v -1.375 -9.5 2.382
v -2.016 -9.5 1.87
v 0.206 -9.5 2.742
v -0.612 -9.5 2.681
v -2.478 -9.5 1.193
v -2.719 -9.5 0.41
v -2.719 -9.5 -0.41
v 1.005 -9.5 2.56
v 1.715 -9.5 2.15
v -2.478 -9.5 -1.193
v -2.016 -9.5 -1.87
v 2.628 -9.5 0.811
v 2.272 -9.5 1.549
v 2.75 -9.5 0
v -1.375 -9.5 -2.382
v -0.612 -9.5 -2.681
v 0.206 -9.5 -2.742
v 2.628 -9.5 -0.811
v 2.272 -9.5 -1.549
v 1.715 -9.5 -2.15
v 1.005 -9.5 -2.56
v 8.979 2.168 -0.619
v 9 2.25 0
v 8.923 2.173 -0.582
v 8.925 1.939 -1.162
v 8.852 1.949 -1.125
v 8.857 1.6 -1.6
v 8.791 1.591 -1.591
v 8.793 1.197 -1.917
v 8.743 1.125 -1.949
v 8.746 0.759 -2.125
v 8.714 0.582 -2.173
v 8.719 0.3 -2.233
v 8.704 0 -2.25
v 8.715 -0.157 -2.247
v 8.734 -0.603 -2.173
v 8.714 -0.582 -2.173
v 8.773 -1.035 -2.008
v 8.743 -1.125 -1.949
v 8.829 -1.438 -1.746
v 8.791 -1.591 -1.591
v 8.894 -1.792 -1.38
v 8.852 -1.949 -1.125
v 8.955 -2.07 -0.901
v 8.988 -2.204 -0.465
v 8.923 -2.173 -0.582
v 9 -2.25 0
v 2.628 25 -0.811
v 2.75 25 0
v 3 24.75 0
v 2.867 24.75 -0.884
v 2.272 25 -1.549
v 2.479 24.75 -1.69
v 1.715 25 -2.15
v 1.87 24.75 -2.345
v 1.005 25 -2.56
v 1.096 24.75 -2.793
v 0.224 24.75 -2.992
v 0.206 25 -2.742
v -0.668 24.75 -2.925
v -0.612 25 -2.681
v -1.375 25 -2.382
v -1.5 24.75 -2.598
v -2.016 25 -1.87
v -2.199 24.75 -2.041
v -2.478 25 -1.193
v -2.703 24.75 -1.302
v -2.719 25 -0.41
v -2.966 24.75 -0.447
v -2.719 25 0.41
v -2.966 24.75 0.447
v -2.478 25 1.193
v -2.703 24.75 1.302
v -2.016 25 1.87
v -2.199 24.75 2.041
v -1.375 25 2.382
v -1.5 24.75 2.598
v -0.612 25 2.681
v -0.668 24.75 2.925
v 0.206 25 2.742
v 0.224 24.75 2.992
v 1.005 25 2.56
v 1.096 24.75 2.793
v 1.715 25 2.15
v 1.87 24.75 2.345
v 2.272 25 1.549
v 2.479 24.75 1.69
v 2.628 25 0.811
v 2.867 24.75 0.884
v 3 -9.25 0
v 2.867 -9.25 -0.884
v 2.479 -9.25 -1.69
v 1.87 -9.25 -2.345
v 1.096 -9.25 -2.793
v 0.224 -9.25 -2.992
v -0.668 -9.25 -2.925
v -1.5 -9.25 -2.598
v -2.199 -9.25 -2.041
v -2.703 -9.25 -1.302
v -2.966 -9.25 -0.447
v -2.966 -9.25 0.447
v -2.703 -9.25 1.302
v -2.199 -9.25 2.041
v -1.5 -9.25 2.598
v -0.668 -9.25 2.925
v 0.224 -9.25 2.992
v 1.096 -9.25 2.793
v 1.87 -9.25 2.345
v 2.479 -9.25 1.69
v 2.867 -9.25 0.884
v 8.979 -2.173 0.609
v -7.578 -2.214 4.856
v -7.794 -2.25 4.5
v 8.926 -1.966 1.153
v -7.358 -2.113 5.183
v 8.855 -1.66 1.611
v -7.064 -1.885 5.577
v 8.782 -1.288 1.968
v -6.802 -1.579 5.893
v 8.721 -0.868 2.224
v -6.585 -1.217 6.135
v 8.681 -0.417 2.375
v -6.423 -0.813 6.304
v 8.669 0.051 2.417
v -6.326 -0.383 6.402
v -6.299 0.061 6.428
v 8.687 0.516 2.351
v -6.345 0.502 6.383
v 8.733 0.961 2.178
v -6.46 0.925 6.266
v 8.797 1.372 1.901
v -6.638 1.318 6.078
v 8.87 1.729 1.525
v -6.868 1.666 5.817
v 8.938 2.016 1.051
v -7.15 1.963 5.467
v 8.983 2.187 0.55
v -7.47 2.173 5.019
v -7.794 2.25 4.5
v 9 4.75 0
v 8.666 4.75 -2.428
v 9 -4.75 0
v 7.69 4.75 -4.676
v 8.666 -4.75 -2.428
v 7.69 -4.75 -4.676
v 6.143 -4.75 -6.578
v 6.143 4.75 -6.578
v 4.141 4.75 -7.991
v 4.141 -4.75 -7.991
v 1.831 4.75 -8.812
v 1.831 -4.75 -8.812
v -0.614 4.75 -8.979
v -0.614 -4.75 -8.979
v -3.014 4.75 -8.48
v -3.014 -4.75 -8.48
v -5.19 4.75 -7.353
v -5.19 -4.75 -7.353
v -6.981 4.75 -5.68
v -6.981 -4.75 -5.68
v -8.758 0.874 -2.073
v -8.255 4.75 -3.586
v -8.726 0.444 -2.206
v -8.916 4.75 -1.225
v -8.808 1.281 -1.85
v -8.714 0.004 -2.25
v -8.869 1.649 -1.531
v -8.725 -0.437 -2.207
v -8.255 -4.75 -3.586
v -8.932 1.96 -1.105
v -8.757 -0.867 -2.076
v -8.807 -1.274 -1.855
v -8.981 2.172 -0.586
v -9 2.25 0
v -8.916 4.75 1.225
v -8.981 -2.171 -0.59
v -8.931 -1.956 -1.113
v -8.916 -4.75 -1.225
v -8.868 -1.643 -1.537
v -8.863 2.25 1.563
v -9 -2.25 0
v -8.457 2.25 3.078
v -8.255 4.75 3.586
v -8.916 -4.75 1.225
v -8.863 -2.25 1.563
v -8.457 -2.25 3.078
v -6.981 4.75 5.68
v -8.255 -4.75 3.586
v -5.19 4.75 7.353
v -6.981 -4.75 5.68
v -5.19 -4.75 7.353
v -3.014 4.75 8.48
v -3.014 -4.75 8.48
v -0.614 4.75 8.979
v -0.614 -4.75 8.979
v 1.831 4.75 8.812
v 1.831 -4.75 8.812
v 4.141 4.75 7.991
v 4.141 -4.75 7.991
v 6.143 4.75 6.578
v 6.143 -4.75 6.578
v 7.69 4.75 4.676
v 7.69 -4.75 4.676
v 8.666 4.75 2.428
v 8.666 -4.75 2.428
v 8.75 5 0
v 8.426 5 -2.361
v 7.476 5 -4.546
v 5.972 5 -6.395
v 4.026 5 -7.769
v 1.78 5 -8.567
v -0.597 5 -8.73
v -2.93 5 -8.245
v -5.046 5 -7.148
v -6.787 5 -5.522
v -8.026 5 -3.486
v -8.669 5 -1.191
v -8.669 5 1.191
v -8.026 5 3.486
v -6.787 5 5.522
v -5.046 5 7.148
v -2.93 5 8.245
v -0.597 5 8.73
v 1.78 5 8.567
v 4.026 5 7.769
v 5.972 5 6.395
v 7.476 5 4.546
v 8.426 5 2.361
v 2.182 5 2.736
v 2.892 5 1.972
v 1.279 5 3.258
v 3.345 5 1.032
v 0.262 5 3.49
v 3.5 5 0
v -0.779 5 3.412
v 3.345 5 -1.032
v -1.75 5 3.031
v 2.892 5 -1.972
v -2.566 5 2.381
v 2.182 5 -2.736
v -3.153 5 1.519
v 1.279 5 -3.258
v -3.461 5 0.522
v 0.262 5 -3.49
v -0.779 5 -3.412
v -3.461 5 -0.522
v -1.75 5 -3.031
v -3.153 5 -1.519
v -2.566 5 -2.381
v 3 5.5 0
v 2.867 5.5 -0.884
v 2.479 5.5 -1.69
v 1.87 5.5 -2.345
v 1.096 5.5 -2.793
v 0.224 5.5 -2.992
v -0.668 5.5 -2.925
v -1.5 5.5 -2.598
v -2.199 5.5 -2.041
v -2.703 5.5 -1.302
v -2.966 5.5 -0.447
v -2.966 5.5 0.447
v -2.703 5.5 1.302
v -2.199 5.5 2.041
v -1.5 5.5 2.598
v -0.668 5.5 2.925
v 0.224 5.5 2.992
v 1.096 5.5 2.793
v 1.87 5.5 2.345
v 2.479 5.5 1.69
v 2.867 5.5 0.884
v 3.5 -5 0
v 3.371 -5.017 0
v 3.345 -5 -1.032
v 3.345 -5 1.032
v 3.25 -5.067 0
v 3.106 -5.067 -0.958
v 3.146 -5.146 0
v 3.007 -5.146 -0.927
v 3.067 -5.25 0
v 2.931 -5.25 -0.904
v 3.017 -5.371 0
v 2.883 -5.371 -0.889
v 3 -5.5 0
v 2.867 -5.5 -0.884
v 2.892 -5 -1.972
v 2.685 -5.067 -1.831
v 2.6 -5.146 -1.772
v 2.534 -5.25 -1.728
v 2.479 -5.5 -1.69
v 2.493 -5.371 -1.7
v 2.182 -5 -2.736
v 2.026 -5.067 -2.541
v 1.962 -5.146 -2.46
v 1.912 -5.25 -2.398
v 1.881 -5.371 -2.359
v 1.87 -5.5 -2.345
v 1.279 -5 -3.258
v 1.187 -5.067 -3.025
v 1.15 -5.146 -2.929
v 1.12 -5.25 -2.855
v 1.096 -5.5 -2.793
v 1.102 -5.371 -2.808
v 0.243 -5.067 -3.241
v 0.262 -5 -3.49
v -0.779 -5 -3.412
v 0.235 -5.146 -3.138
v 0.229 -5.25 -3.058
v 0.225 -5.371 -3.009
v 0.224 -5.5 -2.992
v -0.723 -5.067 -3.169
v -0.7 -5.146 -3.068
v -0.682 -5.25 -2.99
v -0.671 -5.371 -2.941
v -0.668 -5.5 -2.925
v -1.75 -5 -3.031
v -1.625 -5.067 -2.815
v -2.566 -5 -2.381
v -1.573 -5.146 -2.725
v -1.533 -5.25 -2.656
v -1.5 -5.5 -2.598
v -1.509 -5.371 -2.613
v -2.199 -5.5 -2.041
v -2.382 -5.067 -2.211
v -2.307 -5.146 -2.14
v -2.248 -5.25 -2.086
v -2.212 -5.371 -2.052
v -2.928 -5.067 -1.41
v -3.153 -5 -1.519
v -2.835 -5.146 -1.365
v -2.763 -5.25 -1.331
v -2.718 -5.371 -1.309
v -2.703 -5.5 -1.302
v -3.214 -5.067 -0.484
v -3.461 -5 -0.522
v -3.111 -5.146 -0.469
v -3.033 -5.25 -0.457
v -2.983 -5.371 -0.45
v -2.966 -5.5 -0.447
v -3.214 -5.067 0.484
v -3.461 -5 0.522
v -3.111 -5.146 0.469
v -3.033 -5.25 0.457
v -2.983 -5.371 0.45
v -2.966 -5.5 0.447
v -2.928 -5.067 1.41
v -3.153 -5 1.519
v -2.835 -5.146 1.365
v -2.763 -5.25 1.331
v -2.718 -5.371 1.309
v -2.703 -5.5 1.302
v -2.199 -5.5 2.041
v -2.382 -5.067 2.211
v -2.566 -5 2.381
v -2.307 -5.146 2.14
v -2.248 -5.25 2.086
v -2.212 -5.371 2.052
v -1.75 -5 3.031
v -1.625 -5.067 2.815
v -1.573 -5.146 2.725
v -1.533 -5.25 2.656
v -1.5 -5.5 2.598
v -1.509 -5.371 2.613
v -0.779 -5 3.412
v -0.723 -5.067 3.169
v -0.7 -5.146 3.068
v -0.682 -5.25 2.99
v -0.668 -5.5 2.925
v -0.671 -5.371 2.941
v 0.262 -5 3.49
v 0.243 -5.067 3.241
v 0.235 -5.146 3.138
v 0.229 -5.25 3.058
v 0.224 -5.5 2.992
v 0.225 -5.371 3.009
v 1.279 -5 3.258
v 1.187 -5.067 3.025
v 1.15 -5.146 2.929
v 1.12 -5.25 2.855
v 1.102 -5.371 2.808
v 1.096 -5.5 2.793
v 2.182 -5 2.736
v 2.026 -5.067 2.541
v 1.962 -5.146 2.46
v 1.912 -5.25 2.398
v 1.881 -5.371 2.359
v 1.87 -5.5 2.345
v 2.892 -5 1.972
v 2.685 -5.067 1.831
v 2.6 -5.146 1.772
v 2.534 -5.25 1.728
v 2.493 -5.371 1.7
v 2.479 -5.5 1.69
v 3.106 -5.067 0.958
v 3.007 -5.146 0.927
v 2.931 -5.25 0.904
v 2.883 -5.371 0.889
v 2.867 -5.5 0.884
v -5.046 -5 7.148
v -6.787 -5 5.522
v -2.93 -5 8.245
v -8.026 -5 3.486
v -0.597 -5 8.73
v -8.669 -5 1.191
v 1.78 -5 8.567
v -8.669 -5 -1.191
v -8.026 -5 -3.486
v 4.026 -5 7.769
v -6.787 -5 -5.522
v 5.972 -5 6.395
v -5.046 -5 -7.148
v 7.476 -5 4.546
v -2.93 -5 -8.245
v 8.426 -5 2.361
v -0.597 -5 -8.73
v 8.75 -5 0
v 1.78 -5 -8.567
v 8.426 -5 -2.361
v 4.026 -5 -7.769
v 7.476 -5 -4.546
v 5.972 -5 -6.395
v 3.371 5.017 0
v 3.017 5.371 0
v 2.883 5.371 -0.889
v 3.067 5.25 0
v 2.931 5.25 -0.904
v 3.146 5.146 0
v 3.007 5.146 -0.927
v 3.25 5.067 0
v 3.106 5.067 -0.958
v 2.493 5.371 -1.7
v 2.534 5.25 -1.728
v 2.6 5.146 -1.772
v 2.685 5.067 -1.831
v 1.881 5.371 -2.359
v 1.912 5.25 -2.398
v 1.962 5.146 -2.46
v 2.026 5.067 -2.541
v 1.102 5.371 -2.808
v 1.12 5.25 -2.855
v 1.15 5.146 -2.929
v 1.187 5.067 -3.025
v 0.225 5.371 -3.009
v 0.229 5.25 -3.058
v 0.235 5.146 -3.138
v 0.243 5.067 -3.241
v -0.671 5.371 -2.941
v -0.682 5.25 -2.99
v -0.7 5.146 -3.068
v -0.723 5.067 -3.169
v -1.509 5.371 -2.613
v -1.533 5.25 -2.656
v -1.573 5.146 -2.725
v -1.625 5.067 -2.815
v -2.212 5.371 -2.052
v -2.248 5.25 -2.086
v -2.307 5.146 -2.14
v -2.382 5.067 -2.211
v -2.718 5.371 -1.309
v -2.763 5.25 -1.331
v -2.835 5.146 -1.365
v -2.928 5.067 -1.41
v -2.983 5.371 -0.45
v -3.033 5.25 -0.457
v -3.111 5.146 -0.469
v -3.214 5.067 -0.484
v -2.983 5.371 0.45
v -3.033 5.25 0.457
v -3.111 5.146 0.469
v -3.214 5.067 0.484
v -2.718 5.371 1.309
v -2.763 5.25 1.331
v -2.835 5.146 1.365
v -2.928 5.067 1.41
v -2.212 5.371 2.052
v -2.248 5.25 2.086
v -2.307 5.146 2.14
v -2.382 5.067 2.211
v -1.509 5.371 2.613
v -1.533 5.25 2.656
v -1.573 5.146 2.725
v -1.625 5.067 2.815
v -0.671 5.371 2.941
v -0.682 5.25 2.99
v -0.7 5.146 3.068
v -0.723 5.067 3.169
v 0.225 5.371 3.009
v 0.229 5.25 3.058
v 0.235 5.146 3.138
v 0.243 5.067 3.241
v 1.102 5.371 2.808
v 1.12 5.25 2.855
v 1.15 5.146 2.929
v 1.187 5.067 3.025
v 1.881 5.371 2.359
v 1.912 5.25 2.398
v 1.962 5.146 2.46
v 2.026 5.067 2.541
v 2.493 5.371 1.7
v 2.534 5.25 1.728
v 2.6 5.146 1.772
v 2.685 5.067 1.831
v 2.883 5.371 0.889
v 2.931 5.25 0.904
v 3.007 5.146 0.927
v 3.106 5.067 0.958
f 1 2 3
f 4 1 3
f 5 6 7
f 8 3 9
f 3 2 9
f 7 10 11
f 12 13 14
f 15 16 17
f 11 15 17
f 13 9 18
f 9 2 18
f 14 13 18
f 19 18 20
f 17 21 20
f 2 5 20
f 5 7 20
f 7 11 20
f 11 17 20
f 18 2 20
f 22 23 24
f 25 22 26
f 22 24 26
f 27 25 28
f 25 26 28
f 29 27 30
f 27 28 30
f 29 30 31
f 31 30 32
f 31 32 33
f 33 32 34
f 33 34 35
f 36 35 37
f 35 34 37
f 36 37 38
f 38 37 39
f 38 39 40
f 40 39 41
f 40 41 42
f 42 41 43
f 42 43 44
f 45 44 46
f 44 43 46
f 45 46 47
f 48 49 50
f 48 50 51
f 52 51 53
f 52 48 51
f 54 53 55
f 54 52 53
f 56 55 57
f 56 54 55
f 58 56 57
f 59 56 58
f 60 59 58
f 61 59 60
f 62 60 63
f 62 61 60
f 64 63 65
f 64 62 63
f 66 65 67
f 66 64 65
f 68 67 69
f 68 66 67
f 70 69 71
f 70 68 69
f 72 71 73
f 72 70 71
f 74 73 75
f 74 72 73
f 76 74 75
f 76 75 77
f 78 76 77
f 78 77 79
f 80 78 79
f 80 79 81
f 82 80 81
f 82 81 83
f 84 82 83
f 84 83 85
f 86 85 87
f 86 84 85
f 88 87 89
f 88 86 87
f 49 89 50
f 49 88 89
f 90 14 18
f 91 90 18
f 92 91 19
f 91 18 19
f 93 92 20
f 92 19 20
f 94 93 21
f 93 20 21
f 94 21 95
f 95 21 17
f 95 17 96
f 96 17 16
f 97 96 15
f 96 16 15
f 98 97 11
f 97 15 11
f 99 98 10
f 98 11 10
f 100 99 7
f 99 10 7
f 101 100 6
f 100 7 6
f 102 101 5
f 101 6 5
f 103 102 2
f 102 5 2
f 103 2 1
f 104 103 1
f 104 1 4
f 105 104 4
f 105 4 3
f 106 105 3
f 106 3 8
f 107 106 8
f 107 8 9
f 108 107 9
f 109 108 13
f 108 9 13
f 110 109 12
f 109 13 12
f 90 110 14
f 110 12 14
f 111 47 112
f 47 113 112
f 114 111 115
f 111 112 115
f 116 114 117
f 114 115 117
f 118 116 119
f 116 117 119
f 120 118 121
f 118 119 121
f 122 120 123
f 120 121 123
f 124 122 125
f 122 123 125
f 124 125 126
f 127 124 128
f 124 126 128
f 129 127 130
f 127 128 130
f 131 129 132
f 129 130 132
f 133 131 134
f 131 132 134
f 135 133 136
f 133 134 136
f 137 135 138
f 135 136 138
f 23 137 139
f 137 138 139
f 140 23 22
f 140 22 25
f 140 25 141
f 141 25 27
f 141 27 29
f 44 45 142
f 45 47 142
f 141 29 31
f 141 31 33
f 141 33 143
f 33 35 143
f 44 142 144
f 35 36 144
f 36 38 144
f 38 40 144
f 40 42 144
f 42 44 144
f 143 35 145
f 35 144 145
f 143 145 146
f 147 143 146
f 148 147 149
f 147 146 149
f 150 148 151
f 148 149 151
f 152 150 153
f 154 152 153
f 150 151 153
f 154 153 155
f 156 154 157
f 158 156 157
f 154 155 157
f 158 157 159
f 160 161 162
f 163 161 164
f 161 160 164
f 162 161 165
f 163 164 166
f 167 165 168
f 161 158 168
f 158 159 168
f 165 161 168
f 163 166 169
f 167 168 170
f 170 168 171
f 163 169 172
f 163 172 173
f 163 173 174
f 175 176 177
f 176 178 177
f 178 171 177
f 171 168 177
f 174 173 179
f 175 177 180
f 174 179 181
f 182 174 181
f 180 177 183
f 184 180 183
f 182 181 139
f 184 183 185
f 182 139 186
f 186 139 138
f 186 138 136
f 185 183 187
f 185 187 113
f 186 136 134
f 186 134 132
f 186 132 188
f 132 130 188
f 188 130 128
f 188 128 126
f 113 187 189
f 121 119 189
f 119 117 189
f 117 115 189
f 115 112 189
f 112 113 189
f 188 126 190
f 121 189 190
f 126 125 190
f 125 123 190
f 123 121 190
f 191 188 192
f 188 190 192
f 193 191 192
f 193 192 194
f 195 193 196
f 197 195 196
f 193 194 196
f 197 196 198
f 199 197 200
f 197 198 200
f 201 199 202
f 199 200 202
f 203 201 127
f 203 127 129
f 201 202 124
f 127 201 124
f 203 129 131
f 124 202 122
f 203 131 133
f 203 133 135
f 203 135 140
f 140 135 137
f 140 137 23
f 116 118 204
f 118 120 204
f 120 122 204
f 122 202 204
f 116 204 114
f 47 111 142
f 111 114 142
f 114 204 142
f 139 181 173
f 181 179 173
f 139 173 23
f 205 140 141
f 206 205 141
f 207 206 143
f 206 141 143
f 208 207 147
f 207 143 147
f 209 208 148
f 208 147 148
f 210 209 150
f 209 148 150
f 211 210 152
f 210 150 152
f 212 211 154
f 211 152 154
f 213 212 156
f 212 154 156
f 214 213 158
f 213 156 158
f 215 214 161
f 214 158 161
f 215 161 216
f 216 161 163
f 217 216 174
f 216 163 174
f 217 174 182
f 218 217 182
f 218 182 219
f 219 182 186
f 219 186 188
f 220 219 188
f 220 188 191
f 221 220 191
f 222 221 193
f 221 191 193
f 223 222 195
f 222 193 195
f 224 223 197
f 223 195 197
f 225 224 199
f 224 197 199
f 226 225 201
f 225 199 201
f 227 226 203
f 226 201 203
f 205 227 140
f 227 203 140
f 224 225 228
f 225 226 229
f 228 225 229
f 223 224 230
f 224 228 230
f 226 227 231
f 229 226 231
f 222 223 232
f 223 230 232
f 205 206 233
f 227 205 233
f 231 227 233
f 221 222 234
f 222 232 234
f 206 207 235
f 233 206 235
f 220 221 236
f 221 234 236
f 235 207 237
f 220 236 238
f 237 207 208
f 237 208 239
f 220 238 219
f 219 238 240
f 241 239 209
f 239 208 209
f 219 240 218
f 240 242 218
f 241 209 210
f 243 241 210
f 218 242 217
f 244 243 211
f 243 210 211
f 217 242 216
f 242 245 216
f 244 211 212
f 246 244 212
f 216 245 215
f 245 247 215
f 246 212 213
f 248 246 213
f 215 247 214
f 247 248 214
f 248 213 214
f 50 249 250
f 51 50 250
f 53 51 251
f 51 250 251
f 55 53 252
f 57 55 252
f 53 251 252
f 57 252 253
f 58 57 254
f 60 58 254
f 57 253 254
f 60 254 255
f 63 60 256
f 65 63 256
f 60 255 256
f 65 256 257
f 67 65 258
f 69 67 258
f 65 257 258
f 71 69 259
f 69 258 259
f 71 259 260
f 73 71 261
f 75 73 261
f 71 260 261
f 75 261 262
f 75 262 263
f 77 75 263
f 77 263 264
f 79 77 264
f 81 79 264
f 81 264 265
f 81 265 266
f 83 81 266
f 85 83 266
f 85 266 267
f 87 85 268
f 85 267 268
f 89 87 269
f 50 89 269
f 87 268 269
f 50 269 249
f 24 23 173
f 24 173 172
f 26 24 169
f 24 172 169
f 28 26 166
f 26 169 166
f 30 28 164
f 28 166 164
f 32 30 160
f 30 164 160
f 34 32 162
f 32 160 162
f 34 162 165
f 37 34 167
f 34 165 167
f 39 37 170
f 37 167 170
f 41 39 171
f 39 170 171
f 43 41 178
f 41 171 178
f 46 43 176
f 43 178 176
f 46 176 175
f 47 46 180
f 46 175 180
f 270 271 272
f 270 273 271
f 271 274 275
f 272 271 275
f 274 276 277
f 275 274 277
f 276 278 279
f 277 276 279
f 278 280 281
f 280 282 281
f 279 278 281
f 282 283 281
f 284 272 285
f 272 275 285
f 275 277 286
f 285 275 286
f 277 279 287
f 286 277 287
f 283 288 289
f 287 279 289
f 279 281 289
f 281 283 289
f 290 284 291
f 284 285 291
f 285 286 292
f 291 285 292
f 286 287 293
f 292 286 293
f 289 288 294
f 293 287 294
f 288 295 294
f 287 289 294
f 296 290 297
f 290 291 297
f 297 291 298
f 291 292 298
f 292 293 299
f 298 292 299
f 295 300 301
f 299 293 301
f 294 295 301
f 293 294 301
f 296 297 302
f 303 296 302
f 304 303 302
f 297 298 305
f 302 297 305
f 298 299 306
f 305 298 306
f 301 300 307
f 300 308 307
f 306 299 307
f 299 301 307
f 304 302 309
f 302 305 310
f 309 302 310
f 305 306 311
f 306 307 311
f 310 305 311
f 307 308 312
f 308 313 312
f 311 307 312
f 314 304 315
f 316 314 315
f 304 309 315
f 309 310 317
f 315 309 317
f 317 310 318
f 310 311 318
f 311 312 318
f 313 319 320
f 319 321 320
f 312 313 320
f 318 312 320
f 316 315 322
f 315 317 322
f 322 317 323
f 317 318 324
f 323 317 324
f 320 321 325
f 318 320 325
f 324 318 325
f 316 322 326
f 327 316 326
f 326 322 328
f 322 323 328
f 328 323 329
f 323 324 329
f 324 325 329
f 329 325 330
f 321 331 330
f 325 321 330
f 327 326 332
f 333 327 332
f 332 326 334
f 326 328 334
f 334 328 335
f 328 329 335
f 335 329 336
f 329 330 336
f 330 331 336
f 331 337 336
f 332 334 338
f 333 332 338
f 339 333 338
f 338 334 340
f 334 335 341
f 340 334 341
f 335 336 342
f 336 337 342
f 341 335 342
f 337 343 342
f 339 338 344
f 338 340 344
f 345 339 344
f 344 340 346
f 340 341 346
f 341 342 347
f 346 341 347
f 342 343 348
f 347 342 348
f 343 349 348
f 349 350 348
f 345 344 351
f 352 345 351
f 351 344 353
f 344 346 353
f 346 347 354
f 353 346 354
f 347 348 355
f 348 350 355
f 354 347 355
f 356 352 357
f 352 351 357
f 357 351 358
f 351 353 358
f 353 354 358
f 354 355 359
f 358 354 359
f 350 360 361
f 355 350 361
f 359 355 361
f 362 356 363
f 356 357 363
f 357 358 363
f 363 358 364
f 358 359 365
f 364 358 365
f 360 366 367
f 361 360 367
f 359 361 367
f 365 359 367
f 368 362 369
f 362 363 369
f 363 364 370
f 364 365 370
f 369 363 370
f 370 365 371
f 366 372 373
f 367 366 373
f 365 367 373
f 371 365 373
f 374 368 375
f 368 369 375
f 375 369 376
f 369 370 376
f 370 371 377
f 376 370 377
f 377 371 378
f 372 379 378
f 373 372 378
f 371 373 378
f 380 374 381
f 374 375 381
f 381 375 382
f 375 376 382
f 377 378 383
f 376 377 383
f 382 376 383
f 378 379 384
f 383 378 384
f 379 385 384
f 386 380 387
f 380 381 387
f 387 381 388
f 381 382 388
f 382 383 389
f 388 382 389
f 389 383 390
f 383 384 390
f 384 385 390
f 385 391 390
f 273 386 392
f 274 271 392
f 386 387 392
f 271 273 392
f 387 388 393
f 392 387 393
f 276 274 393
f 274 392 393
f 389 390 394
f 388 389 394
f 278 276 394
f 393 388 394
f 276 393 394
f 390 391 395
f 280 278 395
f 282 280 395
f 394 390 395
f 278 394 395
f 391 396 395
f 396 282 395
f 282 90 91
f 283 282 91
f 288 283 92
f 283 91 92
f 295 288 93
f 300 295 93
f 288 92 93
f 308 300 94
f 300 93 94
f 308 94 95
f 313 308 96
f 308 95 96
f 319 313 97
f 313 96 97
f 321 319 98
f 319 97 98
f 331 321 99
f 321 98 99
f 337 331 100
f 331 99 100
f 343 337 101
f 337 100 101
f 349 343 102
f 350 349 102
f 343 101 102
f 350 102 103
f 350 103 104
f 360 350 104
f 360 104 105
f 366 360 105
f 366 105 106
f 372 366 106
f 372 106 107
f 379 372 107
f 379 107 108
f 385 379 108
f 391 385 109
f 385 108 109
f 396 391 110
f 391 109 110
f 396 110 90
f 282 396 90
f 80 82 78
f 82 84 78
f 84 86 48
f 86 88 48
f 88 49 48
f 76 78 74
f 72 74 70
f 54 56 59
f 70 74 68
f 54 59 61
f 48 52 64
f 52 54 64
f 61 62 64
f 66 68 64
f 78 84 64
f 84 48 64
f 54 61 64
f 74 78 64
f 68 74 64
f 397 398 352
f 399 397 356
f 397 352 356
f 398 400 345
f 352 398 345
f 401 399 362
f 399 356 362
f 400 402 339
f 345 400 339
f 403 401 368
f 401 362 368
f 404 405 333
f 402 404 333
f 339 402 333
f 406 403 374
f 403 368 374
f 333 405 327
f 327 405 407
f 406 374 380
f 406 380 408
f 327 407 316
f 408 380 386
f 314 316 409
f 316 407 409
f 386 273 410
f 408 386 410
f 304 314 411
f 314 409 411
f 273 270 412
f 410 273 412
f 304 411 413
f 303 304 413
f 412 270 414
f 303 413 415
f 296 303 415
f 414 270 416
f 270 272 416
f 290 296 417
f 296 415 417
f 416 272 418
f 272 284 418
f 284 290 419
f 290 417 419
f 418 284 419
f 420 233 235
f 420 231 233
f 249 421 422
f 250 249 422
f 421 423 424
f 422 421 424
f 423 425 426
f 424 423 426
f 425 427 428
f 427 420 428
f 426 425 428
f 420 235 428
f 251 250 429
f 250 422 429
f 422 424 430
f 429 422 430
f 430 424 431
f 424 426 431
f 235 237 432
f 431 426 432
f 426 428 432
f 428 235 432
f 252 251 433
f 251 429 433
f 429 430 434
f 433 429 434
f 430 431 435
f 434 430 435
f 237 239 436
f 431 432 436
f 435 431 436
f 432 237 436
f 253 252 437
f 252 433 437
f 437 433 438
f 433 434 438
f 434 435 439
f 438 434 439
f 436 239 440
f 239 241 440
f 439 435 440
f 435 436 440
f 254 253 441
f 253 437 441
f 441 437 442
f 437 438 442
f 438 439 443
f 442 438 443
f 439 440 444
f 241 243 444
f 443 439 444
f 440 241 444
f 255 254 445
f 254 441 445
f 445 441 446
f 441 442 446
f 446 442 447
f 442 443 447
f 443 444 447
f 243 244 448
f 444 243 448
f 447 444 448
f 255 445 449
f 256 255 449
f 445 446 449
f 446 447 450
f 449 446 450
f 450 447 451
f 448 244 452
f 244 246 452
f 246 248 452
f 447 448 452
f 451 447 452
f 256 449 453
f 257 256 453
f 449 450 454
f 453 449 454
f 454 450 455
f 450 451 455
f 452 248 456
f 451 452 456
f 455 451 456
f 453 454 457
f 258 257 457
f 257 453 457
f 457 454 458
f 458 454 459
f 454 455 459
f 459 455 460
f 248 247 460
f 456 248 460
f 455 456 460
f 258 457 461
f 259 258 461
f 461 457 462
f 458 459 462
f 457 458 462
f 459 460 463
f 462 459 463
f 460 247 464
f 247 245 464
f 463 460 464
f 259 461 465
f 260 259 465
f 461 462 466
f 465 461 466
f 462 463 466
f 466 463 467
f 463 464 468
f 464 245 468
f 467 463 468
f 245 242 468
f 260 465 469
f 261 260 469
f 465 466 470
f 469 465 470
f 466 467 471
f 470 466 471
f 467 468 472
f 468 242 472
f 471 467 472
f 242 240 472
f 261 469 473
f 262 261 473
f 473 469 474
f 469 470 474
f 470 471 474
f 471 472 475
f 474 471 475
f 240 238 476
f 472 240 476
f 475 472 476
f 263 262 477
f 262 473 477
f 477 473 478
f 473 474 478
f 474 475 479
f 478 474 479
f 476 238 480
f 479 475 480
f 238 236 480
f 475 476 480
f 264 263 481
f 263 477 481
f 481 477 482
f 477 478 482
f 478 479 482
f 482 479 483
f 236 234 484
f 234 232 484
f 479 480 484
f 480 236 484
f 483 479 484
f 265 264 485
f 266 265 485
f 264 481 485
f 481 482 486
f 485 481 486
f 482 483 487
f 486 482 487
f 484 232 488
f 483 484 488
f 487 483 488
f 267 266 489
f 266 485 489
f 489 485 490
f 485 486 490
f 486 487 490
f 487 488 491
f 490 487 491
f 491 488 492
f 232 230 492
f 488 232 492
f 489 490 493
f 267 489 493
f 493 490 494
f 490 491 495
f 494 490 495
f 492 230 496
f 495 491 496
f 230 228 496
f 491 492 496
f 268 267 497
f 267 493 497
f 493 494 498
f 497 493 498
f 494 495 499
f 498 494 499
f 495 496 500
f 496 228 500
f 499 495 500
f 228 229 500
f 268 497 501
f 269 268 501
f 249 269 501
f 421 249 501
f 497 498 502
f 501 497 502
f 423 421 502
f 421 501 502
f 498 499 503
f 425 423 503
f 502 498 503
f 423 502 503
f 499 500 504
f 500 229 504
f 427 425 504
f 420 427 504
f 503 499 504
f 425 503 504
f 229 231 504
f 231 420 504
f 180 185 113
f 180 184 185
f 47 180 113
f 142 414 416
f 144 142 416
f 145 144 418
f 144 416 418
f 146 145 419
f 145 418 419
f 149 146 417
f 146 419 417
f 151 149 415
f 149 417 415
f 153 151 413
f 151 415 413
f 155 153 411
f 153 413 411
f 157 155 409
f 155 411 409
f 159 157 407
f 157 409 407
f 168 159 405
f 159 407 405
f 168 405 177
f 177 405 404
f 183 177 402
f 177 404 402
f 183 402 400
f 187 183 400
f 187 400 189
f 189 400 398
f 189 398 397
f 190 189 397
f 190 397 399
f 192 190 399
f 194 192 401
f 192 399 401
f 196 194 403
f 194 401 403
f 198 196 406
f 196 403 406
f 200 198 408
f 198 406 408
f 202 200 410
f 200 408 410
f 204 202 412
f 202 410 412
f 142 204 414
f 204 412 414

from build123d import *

# Parameters (mm, degrees)
ESBO_O2_R                  = 2.25
CORTE_EXTRUS_O2_DEPTH      = 19
ESBO_O7_R                  = 2.25
CORTE_EXTRUS_O6_DEPTH      = 3.329371528
CORTE_EXTRUS_O6_DEPTH_BACK = 20.716036402
CUT_EXTRUDE1_DEPTH         = 2.25
FILLET1_R                  = 0.5
CHAMFER1_SIZE              = 0.25
CHAMFER4_SIZE              = 0.25


with BuildPart() as part:
    # Esboço1 → Revolução1 (revolve)
    with BuildSketch(Plane.XY):
        Polygon((0, 25), (3, 25), (3, 5), (9, 5), (9, -5), (3, -5), (3, -9.5), (0, -9.5), (0, 0), align=None)
    revolve(axis=Axis((0, 0, 0), (0, 1, 0)))

    # Esboço2 → Corte-extrusão2 (cut, through all)
    with BuildSketch(Plane.ZY.offset(9)):
        Circle(ESBO_O2_R)
    extrude(amount=-CORTE_EXTRUS_O2_DEPTH, mode=Mode.SUBTRACT)

    # Esboço7 → Corte-extrusão6 (cut, two sides)
    with BuildSketch(Plane(origin=(-7.794228634, 0, 4.5), x_dir=(0.258819045, 0, 0.965925826), z_dir=(-0.965925826, 0, 0.258819045))) as corte_extrus_o6_sk:
        Circle(ESBO_O7_R)
    extrude(amount=CORTE_EXTRUS_O6_DEPTH, mode=Mode.SUBTRACT)
    extrude(corte_extrus_o6_sk.sketch, amount=-CORTE_EXTRUS_O6_DEPTH_BACK, mode=Mode.SUBTRACT)

    # Sketch1 → Cut-Extrude1 (cut, symmetric)
    with BuildSketch(Plane(origin=(0, 0, 0), x_dir=(1, 0, 0), z_dir=(0, 1, 0))):
        Polygon((9, 0), (-10.844388007, 0), (-10.42876147, -5.205920946), align=None)
    extrude(amount=CUT_EXTRUDE1_DEPTH, both=True, mode=Mode.SUBTRACT)

    # Fillet1
    fillet1_edges = [part.edges().sort_by_distance(p)[0] for p in [
        (-3, -5, 0),
        (-3, 5, 0),
    ]]
    fillet(fillet1_edges, radius=FILLET1_R)

    # Chamfer1
    chamfer1_edges = [part.edges().sort_by_distance(p)[0] for p in [
        (-3, -9.5, 0),
        (-3, 25, 0),
    ]]
    chamfer(chamfer1_edges, length=CHAMFER1_SIZE)

    # Chamfer4
    chamfer4_edges = [part.edges().sort_by_distance(p)[0] for p in [
        (-9, -5, 0),
        (-9, 5, 0),
    ]]
    chamfer(chamfer4_edges, length=CHAMFER4_SIZE)


solid = part.part
